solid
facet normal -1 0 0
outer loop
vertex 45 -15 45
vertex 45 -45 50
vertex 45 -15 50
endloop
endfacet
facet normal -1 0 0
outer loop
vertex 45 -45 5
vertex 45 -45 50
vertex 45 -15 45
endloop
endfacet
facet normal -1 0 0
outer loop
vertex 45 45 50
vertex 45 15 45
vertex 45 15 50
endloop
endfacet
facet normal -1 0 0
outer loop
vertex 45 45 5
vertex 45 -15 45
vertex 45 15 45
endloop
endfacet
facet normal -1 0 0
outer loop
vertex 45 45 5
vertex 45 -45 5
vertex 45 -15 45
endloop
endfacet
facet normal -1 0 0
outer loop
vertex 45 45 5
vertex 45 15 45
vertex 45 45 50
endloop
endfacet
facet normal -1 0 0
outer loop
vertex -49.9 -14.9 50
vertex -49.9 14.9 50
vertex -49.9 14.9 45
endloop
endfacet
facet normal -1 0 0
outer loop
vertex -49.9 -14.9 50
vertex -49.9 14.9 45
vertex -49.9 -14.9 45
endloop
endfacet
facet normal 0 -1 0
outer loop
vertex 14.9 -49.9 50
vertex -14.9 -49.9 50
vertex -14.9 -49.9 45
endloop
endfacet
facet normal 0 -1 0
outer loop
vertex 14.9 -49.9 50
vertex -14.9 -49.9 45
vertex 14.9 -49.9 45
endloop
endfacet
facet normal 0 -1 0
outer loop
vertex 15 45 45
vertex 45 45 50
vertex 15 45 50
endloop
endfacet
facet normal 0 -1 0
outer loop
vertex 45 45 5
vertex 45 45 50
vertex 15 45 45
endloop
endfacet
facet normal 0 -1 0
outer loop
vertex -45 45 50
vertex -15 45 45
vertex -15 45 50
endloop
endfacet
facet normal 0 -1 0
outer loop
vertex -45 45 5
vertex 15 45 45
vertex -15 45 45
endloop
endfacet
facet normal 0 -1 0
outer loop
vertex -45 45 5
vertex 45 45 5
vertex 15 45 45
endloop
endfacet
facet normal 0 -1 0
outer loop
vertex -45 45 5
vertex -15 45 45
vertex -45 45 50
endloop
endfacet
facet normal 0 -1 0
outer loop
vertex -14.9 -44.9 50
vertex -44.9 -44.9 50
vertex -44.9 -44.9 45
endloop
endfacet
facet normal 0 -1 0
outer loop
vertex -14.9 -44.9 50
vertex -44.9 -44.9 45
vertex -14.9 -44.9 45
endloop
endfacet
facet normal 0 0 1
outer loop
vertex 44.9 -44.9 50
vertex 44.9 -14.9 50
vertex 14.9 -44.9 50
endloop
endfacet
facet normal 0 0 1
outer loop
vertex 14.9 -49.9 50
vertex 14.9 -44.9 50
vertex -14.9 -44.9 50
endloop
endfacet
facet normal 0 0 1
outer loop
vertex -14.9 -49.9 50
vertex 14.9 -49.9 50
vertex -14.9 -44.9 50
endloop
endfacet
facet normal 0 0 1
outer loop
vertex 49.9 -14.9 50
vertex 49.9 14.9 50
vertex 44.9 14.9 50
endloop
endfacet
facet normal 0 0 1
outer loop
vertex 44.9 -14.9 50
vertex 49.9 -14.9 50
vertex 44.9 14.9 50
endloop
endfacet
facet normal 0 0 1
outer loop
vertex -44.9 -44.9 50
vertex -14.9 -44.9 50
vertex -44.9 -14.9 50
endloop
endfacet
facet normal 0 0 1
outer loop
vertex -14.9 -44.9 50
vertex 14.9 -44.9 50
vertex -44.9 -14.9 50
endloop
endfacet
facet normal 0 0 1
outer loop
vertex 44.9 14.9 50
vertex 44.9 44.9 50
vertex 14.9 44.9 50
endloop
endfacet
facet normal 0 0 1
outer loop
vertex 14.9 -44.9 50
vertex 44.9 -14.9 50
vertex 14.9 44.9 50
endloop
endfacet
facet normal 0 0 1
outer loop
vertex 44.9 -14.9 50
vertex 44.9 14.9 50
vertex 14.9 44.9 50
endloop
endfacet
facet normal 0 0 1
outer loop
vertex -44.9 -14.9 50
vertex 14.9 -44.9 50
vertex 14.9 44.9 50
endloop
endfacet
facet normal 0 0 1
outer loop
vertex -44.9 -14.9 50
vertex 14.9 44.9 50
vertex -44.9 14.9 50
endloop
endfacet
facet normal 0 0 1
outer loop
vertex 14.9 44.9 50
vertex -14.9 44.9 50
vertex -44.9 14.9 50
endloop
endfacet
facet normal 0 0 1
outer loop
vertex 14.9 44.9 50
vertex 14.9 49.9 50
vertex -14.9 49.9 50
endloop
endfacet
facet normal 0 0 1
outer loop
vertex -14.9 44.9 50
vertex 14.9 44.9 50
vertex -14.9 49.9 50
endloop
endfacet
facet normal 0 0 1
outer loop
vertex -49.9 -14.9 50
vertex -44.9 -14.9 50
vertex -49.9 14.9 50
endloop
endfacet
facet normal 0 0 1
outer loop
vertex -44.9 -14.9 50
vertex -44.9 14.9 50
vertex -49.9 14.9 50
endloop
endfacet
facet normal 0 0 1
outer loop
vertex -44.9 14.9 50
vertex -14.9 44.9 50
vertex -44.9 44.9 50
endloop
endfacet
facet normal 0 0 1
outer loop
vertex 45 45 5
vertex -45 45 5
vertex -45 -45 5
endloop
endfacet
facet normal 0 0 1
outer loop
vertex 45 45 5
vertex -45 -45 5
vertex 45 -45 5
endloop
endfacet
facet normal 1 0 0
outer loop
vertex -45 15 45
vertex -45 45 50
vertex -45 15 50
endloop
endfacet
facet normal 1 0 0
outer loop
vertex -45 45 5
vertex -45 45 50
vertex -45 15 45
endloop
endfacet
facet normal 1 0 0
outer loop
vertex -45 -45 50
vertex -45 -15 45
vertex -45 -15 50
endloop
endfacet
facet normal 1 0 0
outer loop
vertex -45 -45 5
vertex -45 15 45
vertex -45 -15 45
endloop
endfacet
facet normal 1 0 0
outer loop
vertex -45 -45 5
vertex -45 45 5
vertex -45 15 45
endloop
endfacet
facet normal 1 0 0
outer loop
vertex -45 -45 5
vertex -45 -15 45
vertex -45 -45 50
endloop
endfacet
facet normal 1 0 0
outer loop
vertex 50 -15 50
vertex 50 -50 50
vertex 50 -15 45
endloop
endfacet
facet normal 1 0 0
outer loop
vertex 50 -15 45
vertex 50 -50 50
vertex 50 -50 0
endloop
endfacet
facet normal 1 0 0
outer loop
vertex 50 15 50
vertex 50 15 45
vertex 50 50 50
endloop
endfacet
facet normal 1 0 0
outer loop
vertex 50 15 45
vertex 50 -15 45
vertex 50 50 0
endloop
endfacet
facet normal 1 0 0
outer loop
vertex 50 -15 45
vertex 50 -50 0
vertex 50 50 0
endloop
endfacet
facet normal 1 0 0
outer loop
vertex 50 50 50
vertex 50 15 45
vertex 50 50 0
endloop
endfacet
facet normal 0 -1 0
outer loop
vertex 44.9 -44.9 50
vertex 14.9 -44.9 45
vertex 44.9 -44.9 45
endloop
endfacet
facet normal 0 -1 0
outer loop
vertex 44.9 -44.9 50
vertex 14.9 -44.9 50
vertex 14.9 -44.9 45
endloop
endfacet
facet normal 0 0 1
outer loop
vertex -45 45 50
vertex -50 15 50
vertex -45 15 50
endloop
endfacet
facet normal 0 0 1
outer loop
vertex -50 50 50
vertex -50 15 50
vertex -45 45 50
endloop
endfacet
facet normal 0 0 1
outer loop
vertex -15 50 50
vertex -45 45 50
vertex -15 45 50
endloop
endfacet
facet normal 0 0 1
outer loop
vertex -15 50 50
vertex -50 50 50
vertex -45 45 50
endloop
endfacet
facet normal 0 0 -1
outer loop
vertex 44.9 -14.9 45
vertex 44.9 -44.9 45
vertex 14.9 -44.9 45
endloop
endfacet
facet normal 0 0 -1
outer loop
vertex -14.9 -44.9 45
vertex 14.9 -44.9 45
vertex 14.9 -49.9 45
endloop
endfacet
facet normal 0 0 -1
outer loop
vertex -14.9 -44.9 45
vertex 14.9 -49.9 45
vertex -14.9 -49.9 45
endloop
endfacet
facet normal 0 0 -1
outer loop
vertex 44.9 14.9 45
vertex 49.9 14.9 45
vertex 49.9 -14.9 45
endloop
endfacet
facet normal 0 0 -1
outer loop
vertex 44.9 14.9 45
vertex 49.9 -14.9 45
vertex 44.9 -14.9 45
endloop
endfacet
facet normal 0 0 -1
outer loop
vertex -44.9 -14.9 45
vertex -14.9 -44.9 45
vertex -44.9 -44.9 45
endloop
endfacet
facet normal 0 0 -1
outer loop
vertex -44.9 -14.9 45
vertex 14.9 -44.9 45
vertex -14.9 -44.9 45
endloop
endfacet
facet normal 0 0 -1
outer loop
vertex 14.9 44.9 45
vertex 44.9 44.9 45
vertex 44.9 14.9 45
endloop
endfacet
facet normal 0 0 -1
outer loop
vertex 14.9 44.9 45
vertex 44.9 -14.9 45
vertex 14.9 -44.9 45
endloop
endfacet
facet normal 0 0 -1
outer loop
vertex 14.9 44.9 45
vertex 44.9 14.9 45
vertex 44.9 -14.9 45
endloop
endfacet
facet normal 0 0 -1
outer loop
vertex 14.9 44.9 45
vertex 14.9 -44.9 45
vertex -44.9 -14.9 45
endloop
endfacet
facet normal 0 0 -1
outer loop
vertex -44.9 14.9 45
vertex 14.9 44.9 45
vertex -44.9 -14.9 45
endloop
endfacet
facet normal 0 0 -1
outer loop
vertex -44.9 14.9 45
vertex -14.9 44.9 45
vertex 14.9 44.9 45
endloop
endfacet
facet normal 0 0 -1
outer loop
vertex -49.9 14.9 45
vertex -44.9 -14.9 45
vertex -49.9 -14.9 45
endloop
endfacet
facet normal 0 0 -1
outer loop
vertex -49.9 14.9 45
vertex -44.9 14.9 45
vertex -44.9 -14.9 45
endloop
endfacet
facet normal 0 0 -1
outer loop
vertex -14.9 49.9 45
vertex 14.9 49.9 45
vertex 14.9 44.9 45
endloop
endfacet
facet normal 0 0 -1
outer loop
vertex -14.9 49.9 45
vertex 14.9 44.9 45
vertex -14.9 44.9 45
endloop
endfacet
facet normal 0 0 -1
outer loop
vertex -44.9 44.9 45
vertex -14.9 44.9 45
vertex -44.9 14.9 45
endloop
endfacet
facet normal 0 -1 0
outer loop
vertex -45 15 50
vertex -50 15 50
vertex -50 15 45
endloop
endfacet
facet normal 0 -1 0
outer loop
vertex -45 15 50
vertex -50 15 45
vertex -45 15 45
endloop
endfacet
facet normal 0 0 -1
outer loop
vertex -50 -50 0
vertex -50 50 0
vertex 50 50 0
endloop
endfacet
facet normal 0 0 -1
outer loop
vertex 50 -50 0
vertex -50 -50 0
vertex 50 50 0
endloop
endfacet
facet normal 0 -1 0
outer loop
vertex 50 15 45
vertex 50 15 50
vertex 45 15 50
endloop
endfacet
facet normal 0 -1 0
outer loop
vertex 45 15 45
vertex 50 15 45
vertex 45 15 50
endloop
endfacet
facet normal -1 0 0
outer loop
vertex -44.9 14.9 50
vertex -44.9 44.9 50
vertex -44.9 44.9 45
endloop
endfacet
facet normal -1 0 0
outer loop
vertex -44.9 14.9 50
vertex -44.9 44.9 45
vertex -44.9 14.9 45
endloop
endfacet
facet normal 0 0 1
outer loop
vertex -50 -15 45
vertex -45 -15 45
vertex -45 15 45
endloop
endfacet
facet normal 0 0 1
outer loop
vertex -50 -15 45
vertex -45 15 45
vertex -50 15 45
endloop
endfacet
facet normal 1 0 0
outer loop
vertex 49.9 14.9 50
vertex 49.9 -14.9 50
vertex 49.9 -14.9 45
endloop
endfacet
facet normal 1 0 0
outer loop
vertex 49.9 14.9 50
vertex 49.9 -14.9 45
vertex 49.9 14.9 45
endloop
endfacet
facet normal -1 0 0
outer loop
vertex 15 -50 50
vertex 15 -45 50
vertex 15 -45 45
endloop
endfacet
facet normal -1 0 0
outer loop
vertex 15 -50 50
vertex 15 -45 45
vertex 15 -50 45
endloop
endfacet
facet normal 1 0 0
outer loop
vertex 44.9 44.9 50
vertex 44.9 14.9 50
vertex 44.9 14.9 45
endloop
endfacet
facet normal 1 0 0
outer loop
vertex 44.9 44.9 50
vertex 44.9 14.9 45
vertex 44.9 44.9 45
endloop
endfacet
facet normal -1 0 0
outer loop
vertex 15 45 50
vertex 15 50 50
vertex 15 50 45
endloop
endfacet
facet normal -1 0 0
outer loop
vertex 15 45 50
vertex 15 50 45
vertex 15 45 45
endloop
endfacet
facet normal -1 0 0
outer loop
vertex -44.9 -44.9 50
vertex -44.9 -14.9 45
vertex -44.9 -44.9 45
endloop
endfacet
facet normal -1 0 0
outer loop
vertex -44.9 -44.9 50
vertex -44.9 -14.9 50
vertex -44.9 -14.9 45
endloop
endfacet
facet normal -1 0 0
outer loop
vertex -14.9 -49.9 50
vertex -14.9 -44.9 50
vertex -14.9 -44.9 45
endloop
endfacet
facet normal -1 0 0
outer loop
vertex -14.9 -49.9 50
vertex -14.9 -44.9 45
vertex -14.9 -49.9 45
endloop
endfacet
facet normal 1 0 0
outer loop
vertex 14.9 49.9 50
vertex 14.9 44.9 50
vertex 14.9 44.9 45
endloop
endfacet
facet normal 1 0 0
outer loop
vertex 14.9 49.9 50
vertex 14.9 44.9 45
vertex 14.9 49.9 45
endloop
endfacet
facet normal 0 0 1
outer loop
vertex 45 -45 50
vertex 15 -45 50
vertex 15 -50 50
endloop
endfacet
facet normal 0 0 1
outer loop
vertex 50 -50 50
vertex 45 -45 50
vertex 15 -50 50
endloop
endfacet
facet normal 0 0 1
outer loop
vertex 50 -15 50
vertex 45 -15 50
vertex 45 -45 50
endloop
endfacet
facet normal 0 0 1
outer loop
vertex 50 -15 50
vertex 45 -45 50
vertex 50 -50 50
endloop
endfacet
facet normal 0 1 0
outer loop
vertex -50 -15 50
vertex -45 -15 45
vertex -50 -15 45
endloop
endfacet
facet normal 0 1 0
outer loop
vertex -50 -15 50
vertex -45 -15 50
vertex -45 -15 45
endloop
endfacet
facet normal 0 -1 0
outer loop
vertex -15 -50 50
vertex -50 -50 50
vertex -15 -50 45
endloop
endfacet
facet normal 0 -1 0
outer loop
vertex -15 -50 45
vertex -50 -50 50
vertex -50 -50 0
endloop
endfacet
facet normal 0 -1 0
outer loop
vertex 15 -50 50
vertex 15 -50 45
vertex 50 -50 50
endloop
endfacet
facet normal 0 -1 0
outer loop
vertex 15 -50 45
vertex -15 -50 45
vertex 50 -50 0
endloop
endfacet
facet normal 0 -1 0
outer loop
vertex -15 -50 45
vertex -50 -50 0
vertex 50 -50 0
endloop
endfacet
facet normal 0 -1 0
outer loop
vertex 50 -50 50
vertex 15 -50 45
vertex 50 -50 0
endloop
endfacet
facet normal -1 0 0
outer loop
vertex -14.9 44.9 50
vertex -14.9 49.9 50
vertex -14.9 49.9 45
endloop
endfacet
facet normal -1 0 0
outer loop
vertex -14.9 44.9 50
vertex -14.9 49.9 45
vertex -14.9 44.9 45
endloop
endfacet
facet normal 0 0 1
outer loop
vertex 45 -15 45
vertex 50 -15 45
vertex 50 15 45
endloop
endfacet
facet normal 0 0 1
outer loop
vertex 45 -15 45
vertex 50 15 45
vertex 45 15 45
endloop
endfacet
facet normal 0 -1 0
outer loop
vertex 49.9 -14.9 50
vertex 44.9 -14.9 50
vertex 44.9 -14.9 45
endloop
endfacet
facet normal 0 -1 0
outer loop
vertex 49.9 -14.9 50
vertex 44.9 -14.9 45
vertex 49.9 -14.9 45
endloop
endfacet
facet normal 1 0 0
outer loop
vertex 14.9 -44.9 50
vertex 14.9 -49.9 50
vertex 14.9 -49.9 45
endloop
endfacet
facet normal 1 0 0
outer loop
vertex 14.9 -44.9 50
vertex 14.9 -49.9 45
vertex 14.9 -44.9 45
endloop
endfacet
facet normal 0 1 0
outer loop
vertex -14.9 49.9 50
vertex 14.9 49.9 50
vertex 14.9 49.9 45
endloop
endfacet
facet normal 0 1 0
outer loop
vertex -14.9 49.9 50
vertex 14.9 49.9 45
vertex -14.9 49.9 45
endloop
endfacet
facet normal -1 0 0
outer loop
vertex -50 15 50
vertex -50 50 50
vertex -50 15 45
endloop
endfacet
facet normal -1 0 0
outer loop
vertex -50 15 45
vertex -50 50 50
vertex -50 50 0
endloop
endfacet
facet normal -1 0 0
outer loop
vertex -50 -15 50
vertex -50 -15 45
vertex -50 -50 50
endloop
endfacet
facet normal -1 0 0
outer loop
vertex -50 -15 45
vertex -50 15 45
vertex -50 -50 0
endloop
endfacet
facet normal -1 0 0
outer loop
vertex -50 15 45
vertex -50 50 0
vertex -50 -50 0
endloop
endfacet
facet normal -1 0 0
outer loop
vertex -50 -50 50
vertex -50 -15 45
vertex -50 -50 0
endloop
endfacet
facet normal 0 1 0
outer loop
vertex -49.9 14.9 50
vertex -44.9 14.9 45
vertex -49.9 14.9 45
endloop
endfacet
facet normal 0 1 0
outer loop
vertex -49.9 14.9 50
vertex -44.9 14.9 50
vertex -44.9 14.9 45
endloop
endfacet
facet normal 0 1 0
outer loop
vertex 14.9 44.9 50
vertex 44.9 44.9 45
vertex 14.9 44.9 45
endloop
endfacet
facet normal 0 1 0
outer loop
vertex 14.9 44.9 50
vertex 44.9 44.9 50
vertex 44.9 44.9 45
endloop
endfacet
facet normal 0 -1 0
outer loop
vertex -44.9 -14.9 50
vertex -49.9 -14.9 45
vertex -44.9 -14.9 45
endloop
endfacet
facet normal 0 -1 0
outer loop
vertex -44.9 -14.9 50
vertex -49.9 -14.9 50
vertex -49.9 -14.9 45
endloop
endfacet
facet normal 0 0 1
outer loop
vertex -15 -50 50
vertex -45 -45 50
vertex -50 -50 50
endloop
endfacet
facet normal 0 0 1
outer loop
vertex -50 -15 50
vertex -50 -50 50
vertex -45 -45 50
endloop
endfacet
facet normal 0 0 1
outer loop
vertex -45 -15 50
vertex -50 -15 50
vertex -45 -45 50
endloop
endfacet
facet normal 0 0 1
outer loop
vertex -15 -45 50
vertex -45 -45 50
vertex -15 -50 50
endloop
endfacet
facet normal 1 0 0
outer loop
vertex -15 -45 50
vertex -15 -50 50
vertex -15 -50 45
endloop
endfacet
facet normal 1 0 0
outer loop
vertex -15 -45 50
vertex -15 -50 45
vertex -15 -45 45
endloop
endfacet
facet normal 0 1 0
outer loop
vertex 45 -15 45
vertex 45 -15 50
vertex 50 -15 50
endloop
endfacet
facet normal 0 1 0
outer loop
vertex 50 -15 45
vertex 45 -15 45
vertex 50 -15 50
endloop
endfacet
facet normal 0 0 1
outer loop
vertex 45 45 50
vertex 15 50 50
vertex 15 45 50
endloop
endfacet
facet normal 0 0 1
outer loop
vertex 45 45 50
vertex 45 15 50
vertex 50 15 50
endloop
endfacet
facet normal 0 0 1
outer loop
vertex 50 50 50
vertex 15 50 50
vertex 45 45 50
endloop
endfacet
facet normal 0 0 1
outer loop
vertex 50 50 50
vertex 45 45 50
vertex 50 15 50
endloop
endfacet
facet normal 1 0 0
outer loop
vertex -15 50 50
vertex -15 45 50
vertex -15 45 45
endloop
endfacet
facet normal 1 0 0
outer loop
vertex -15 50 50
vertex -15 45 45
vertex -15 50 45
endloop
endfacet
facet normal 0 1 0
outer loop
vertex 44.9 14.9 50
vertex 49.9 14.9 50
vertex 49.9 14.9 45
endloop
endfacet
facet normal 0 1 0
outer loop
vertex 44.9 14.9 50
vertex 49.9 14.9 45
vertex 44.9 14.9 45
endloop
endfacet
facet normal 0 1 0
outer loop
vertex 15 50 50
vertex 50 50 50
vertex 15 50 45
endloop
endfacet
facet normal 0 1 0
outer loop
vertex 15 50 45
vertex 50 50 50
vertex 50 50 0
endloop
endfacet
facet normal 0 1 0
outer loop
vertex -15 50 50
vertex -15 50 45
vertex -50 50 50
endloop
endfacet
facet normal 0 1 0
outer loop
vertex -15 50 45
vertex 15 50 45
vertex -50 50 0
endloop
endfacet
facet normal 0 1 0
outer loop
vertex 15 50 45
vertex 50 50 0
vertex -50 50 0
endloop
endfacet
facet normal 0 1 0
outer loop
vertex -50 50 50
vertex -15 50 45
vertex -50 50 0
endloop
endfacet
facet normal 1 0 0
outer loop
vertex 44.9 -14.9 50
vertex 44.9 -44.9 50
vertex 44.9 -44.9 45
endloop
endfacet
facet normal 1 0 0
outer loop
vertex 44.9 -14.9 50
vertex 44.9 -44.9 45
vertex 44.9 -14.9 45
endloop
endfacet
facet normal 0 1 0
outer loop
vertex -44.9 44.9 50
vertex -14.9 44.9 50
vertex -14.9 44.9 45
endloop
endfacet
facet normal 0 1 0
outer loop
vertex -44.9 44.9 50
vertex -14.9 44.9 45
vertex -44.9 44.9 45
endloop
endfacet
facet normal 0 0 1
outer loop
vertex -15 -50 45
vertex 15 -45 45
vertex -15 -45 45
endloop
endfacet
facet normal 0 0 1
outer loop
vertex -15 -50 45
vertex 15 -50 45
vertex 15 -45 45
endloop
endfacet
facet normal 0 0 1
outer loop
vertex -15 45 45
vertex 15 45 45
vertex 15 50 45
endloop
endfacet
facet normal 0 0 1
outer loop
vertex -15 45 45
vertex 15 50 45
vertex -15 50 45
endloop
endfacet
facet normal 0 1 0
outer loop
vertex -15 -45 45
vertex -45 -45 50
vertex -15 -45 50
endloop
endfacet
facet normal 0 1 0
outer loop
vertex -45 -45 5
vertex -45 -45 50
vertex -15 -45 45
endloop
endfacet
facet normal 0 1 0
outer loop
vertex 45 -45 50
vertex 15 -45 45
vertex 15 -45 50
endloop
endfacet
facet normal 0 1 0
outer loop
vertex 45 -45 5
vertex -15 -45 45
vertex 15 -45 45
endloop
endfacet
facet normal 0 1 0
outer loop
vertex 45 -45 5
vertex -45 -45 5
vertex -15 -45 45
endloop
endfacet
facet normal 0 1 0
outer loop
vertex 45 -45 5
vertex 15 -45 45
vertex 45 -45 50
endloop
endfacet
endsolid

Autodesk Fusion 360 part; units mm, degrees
sketch "Schizzo1" plane through (0, 0, 0) normal (0, 0, 1) x (1, 0, 0) in component "Base"
  line L0 (50, 50) -> (-50, 50)
  line L1 (-50, 50) -> (-50, -50)
  line L2 (-50, -50) -> (50, -50)
  line L3 (50, -50) -> (50, 50)
  line L4 (50, 50) -> (-50, -50) construction
  line L5 (-50, 50) -> (50, -50) construction
  dimension "d9" = 100
  dimension "d10" = 100
extrude "Estrusione1" add sketch "Schizzo1" along normal blind 50 makes body 1 in component "Base"
shell "Svuotamento2" thickness 5 removed faces 1 at (16.6667, -16.6667, 50) on bodies 1 in component "Base"
sketch "Schizzo2" plane through (0, 0, 50) normal (0, 0, 1) x (-1, 0, 0) in component "Base"
  line L0 (-45, 45) -> (45, 45)
  line L1 (45, 45) -> (45, -45)
  line L2 (45, -45) -> (-45, -45)
  line L3 (-45, -45) -> (-45, 45)
  line L4 (-50, 50) -> (-50, -50)
  line L5 (-50, -50) -> (50, -50)
  line L6 (50, -50) -> (50, 50)
  line L7 (50, 50) -> (-50, 50)
  line L8 (15, -50) -> (-15, -50)
  line L9 (-15, -50) -> (-15, -45)
  line L10 (-15, -45) -> (15, -45)
  line L11 (15, -45) -> (15, -50)
  line L12 (-50, -15) -> (-45, -15)
  line L13 (-45, -15) -> (-45, 15)
  line L14 (-45, 15) -> (-50, 15)
  line L15 (-50, 15) -> (-50, -15)
  line L16 (15, 45) -> (-15, 45)
  line L17 (-15, 45) -> (-15, 50)
  line L18 (-15, 50) -> (15, 50)
  line L19 (15, 50) -> (15, 45)
  line L20 (50, -15) -> (45, -15)
  line L21 (45, -15) -> (45, 15)
  line L22 (45, 15) -> (50, 15)
  line L23 (50, 15) -> (50, -15)
  line L24 (0, -1.75) -> (0, -22.5)
  line L25 (-1.75, 0) -> (-22.5, 0)
  dimension "d15" = 30
extrude "Estrusione2" cut sketch "Schizzo2" against normal blind 5 contours L0 L7 L16 L17 L18 L19 | L3 L4 L12 L13 L14 L15 | L1 L6 L20 L21 L22 L23 | L2 L5 L8 L9 L10 L11 bodies 1 in component "Base"
sketch "Schizzo2 (2)" plane through (0, 0, 45) normal (0, 0, 1) x (-1, 0, 0) in component "Coperchio"
  line L0 (15, 50) -> (-15, 50) construction
  line L1 (-15, 50) -> (-15, 45) construction
  line L2 (15, 45) -> (15, 50) construction
  line L3 (15, -50) -> (-15, -50) construction
  line L4 (15, -45) -> (15, -50) construction
  line L5 (45, -45) -> (15, -45) construction
  line L6 (45, -15) -> (45, -45) construction
  line L7 (50, -15) -> (45, -15) construction
  line L8 (50, 15) -> (50, -15) construction
  line L9 (45, 15) -> (50, 15) construction
  line L10 (45, 45) -> (45, 15) construction
  line L11 (15, 45) -> (45, 45) construction
  line L12 (15, 50) -> (15, 45) construction
  line L13 (-15, 50) -> (15, 50) construction
  line L14 (-15, 45) -> (-15, 50) construction
  line L15 (-45, 45) -> (-15, 45) construction
  line L16 (-45, 15) -> (-45, 45) construction
  line L17 (-50, 15) -> (-45, 15) construction
  line L18 (-50, -15) -> (-50, 15) construction
  line L19 (-45, -15) -> (-50, -15) construction
  line L20 (-45, -45) -> (-45, -15) construction
  line L21 (-15, -45) -> (-45, -45) construction
  line L22 (-15, -50) -> (-15, -45) construction
  line L23 (50, -15) -> (45, -15) construction
  line L24 (45, -15) -> (45, -45) construction
  line L25 (45, -45) -> (15, -45) construction
  line L26 (15, -45) -> (15, -50) construction
  line L27 (-49.9, -14.9) -> (-49.9, 14.9)
  line L28 (-49.9, 14.9) -> (-44.9, 14.9)
  line L29 (-44.9, 14.9) -> (-44.9, 44.9)
  line L30 (-44.9, 44.9) -> (-14.9, 44.9)
  line L31 (-14.9, 44.9) -> (-14.9, 49.9)
  line L32 (-14.9, 49.9) -> (14.9, 49.9)
  line L33 (14.9, 49.9) -> (14.9, 44.9)
  line L34 (14.9, 44.9) -> (44.9, 44.9)
  line L35 (44.9, 44.9) -> (44.9, 14.9)
  line L36 (44.9, 14.9) -> (49.9, 14.9)
  line L37 (49.9, 14.9) -> (49.9, -14.9)
  line L38 (49.9, -14.9) -> (44.9, -14.9)
  line L39 (44.9, -14.9) -> (44.9, -44.9)
  line L40 (44.9, -44.9) -> (14.9, -44.9)
  line L41 (14.9, -44.9) -> (14.9, -49.9)
  line L42 (14.9, -49.9) -> (-14.9, -49.9)
  line L43 (-14.9, -49.9) -> (-14.9, -44.9)
  line L44 (-14.9, -44.9) -> (-44.9, -44.9)
  line L45 (-44.9, -44.9) -> (-44.9, -14.9)
  line L46 (-44.9, -14.9) -> (-49.9, -14.9)
  dimension "d18" = 0.1
extrude "Estrusione1'" add sketch "Schizzo2 (2)" along normal up to surface (5 mm away) separate body makes body 2 in component "Coperchio"
component "Base" placed x (1, 0, 0) y (0, 1, 0) z (0, 0, 1) at (0, 0, 0)
component "Coperchio" placed x (1, 0, 0) y (0, -1, 0) z (0, 0, -1) at (0, 0, 95)
equation "Larghezza_Base = 100 mm"
equation "Profondità = 100 mm"
equation "Altezza = 50 mm"
equation "Spessore = 5 mm"
equation "d9 = Larghezza_Base"
equation "d10 = Profondità"
equation "d11 = Altezza"
equation "d14 = Spessore"
equation "d16 = -Spessore"
properties part number "100"
